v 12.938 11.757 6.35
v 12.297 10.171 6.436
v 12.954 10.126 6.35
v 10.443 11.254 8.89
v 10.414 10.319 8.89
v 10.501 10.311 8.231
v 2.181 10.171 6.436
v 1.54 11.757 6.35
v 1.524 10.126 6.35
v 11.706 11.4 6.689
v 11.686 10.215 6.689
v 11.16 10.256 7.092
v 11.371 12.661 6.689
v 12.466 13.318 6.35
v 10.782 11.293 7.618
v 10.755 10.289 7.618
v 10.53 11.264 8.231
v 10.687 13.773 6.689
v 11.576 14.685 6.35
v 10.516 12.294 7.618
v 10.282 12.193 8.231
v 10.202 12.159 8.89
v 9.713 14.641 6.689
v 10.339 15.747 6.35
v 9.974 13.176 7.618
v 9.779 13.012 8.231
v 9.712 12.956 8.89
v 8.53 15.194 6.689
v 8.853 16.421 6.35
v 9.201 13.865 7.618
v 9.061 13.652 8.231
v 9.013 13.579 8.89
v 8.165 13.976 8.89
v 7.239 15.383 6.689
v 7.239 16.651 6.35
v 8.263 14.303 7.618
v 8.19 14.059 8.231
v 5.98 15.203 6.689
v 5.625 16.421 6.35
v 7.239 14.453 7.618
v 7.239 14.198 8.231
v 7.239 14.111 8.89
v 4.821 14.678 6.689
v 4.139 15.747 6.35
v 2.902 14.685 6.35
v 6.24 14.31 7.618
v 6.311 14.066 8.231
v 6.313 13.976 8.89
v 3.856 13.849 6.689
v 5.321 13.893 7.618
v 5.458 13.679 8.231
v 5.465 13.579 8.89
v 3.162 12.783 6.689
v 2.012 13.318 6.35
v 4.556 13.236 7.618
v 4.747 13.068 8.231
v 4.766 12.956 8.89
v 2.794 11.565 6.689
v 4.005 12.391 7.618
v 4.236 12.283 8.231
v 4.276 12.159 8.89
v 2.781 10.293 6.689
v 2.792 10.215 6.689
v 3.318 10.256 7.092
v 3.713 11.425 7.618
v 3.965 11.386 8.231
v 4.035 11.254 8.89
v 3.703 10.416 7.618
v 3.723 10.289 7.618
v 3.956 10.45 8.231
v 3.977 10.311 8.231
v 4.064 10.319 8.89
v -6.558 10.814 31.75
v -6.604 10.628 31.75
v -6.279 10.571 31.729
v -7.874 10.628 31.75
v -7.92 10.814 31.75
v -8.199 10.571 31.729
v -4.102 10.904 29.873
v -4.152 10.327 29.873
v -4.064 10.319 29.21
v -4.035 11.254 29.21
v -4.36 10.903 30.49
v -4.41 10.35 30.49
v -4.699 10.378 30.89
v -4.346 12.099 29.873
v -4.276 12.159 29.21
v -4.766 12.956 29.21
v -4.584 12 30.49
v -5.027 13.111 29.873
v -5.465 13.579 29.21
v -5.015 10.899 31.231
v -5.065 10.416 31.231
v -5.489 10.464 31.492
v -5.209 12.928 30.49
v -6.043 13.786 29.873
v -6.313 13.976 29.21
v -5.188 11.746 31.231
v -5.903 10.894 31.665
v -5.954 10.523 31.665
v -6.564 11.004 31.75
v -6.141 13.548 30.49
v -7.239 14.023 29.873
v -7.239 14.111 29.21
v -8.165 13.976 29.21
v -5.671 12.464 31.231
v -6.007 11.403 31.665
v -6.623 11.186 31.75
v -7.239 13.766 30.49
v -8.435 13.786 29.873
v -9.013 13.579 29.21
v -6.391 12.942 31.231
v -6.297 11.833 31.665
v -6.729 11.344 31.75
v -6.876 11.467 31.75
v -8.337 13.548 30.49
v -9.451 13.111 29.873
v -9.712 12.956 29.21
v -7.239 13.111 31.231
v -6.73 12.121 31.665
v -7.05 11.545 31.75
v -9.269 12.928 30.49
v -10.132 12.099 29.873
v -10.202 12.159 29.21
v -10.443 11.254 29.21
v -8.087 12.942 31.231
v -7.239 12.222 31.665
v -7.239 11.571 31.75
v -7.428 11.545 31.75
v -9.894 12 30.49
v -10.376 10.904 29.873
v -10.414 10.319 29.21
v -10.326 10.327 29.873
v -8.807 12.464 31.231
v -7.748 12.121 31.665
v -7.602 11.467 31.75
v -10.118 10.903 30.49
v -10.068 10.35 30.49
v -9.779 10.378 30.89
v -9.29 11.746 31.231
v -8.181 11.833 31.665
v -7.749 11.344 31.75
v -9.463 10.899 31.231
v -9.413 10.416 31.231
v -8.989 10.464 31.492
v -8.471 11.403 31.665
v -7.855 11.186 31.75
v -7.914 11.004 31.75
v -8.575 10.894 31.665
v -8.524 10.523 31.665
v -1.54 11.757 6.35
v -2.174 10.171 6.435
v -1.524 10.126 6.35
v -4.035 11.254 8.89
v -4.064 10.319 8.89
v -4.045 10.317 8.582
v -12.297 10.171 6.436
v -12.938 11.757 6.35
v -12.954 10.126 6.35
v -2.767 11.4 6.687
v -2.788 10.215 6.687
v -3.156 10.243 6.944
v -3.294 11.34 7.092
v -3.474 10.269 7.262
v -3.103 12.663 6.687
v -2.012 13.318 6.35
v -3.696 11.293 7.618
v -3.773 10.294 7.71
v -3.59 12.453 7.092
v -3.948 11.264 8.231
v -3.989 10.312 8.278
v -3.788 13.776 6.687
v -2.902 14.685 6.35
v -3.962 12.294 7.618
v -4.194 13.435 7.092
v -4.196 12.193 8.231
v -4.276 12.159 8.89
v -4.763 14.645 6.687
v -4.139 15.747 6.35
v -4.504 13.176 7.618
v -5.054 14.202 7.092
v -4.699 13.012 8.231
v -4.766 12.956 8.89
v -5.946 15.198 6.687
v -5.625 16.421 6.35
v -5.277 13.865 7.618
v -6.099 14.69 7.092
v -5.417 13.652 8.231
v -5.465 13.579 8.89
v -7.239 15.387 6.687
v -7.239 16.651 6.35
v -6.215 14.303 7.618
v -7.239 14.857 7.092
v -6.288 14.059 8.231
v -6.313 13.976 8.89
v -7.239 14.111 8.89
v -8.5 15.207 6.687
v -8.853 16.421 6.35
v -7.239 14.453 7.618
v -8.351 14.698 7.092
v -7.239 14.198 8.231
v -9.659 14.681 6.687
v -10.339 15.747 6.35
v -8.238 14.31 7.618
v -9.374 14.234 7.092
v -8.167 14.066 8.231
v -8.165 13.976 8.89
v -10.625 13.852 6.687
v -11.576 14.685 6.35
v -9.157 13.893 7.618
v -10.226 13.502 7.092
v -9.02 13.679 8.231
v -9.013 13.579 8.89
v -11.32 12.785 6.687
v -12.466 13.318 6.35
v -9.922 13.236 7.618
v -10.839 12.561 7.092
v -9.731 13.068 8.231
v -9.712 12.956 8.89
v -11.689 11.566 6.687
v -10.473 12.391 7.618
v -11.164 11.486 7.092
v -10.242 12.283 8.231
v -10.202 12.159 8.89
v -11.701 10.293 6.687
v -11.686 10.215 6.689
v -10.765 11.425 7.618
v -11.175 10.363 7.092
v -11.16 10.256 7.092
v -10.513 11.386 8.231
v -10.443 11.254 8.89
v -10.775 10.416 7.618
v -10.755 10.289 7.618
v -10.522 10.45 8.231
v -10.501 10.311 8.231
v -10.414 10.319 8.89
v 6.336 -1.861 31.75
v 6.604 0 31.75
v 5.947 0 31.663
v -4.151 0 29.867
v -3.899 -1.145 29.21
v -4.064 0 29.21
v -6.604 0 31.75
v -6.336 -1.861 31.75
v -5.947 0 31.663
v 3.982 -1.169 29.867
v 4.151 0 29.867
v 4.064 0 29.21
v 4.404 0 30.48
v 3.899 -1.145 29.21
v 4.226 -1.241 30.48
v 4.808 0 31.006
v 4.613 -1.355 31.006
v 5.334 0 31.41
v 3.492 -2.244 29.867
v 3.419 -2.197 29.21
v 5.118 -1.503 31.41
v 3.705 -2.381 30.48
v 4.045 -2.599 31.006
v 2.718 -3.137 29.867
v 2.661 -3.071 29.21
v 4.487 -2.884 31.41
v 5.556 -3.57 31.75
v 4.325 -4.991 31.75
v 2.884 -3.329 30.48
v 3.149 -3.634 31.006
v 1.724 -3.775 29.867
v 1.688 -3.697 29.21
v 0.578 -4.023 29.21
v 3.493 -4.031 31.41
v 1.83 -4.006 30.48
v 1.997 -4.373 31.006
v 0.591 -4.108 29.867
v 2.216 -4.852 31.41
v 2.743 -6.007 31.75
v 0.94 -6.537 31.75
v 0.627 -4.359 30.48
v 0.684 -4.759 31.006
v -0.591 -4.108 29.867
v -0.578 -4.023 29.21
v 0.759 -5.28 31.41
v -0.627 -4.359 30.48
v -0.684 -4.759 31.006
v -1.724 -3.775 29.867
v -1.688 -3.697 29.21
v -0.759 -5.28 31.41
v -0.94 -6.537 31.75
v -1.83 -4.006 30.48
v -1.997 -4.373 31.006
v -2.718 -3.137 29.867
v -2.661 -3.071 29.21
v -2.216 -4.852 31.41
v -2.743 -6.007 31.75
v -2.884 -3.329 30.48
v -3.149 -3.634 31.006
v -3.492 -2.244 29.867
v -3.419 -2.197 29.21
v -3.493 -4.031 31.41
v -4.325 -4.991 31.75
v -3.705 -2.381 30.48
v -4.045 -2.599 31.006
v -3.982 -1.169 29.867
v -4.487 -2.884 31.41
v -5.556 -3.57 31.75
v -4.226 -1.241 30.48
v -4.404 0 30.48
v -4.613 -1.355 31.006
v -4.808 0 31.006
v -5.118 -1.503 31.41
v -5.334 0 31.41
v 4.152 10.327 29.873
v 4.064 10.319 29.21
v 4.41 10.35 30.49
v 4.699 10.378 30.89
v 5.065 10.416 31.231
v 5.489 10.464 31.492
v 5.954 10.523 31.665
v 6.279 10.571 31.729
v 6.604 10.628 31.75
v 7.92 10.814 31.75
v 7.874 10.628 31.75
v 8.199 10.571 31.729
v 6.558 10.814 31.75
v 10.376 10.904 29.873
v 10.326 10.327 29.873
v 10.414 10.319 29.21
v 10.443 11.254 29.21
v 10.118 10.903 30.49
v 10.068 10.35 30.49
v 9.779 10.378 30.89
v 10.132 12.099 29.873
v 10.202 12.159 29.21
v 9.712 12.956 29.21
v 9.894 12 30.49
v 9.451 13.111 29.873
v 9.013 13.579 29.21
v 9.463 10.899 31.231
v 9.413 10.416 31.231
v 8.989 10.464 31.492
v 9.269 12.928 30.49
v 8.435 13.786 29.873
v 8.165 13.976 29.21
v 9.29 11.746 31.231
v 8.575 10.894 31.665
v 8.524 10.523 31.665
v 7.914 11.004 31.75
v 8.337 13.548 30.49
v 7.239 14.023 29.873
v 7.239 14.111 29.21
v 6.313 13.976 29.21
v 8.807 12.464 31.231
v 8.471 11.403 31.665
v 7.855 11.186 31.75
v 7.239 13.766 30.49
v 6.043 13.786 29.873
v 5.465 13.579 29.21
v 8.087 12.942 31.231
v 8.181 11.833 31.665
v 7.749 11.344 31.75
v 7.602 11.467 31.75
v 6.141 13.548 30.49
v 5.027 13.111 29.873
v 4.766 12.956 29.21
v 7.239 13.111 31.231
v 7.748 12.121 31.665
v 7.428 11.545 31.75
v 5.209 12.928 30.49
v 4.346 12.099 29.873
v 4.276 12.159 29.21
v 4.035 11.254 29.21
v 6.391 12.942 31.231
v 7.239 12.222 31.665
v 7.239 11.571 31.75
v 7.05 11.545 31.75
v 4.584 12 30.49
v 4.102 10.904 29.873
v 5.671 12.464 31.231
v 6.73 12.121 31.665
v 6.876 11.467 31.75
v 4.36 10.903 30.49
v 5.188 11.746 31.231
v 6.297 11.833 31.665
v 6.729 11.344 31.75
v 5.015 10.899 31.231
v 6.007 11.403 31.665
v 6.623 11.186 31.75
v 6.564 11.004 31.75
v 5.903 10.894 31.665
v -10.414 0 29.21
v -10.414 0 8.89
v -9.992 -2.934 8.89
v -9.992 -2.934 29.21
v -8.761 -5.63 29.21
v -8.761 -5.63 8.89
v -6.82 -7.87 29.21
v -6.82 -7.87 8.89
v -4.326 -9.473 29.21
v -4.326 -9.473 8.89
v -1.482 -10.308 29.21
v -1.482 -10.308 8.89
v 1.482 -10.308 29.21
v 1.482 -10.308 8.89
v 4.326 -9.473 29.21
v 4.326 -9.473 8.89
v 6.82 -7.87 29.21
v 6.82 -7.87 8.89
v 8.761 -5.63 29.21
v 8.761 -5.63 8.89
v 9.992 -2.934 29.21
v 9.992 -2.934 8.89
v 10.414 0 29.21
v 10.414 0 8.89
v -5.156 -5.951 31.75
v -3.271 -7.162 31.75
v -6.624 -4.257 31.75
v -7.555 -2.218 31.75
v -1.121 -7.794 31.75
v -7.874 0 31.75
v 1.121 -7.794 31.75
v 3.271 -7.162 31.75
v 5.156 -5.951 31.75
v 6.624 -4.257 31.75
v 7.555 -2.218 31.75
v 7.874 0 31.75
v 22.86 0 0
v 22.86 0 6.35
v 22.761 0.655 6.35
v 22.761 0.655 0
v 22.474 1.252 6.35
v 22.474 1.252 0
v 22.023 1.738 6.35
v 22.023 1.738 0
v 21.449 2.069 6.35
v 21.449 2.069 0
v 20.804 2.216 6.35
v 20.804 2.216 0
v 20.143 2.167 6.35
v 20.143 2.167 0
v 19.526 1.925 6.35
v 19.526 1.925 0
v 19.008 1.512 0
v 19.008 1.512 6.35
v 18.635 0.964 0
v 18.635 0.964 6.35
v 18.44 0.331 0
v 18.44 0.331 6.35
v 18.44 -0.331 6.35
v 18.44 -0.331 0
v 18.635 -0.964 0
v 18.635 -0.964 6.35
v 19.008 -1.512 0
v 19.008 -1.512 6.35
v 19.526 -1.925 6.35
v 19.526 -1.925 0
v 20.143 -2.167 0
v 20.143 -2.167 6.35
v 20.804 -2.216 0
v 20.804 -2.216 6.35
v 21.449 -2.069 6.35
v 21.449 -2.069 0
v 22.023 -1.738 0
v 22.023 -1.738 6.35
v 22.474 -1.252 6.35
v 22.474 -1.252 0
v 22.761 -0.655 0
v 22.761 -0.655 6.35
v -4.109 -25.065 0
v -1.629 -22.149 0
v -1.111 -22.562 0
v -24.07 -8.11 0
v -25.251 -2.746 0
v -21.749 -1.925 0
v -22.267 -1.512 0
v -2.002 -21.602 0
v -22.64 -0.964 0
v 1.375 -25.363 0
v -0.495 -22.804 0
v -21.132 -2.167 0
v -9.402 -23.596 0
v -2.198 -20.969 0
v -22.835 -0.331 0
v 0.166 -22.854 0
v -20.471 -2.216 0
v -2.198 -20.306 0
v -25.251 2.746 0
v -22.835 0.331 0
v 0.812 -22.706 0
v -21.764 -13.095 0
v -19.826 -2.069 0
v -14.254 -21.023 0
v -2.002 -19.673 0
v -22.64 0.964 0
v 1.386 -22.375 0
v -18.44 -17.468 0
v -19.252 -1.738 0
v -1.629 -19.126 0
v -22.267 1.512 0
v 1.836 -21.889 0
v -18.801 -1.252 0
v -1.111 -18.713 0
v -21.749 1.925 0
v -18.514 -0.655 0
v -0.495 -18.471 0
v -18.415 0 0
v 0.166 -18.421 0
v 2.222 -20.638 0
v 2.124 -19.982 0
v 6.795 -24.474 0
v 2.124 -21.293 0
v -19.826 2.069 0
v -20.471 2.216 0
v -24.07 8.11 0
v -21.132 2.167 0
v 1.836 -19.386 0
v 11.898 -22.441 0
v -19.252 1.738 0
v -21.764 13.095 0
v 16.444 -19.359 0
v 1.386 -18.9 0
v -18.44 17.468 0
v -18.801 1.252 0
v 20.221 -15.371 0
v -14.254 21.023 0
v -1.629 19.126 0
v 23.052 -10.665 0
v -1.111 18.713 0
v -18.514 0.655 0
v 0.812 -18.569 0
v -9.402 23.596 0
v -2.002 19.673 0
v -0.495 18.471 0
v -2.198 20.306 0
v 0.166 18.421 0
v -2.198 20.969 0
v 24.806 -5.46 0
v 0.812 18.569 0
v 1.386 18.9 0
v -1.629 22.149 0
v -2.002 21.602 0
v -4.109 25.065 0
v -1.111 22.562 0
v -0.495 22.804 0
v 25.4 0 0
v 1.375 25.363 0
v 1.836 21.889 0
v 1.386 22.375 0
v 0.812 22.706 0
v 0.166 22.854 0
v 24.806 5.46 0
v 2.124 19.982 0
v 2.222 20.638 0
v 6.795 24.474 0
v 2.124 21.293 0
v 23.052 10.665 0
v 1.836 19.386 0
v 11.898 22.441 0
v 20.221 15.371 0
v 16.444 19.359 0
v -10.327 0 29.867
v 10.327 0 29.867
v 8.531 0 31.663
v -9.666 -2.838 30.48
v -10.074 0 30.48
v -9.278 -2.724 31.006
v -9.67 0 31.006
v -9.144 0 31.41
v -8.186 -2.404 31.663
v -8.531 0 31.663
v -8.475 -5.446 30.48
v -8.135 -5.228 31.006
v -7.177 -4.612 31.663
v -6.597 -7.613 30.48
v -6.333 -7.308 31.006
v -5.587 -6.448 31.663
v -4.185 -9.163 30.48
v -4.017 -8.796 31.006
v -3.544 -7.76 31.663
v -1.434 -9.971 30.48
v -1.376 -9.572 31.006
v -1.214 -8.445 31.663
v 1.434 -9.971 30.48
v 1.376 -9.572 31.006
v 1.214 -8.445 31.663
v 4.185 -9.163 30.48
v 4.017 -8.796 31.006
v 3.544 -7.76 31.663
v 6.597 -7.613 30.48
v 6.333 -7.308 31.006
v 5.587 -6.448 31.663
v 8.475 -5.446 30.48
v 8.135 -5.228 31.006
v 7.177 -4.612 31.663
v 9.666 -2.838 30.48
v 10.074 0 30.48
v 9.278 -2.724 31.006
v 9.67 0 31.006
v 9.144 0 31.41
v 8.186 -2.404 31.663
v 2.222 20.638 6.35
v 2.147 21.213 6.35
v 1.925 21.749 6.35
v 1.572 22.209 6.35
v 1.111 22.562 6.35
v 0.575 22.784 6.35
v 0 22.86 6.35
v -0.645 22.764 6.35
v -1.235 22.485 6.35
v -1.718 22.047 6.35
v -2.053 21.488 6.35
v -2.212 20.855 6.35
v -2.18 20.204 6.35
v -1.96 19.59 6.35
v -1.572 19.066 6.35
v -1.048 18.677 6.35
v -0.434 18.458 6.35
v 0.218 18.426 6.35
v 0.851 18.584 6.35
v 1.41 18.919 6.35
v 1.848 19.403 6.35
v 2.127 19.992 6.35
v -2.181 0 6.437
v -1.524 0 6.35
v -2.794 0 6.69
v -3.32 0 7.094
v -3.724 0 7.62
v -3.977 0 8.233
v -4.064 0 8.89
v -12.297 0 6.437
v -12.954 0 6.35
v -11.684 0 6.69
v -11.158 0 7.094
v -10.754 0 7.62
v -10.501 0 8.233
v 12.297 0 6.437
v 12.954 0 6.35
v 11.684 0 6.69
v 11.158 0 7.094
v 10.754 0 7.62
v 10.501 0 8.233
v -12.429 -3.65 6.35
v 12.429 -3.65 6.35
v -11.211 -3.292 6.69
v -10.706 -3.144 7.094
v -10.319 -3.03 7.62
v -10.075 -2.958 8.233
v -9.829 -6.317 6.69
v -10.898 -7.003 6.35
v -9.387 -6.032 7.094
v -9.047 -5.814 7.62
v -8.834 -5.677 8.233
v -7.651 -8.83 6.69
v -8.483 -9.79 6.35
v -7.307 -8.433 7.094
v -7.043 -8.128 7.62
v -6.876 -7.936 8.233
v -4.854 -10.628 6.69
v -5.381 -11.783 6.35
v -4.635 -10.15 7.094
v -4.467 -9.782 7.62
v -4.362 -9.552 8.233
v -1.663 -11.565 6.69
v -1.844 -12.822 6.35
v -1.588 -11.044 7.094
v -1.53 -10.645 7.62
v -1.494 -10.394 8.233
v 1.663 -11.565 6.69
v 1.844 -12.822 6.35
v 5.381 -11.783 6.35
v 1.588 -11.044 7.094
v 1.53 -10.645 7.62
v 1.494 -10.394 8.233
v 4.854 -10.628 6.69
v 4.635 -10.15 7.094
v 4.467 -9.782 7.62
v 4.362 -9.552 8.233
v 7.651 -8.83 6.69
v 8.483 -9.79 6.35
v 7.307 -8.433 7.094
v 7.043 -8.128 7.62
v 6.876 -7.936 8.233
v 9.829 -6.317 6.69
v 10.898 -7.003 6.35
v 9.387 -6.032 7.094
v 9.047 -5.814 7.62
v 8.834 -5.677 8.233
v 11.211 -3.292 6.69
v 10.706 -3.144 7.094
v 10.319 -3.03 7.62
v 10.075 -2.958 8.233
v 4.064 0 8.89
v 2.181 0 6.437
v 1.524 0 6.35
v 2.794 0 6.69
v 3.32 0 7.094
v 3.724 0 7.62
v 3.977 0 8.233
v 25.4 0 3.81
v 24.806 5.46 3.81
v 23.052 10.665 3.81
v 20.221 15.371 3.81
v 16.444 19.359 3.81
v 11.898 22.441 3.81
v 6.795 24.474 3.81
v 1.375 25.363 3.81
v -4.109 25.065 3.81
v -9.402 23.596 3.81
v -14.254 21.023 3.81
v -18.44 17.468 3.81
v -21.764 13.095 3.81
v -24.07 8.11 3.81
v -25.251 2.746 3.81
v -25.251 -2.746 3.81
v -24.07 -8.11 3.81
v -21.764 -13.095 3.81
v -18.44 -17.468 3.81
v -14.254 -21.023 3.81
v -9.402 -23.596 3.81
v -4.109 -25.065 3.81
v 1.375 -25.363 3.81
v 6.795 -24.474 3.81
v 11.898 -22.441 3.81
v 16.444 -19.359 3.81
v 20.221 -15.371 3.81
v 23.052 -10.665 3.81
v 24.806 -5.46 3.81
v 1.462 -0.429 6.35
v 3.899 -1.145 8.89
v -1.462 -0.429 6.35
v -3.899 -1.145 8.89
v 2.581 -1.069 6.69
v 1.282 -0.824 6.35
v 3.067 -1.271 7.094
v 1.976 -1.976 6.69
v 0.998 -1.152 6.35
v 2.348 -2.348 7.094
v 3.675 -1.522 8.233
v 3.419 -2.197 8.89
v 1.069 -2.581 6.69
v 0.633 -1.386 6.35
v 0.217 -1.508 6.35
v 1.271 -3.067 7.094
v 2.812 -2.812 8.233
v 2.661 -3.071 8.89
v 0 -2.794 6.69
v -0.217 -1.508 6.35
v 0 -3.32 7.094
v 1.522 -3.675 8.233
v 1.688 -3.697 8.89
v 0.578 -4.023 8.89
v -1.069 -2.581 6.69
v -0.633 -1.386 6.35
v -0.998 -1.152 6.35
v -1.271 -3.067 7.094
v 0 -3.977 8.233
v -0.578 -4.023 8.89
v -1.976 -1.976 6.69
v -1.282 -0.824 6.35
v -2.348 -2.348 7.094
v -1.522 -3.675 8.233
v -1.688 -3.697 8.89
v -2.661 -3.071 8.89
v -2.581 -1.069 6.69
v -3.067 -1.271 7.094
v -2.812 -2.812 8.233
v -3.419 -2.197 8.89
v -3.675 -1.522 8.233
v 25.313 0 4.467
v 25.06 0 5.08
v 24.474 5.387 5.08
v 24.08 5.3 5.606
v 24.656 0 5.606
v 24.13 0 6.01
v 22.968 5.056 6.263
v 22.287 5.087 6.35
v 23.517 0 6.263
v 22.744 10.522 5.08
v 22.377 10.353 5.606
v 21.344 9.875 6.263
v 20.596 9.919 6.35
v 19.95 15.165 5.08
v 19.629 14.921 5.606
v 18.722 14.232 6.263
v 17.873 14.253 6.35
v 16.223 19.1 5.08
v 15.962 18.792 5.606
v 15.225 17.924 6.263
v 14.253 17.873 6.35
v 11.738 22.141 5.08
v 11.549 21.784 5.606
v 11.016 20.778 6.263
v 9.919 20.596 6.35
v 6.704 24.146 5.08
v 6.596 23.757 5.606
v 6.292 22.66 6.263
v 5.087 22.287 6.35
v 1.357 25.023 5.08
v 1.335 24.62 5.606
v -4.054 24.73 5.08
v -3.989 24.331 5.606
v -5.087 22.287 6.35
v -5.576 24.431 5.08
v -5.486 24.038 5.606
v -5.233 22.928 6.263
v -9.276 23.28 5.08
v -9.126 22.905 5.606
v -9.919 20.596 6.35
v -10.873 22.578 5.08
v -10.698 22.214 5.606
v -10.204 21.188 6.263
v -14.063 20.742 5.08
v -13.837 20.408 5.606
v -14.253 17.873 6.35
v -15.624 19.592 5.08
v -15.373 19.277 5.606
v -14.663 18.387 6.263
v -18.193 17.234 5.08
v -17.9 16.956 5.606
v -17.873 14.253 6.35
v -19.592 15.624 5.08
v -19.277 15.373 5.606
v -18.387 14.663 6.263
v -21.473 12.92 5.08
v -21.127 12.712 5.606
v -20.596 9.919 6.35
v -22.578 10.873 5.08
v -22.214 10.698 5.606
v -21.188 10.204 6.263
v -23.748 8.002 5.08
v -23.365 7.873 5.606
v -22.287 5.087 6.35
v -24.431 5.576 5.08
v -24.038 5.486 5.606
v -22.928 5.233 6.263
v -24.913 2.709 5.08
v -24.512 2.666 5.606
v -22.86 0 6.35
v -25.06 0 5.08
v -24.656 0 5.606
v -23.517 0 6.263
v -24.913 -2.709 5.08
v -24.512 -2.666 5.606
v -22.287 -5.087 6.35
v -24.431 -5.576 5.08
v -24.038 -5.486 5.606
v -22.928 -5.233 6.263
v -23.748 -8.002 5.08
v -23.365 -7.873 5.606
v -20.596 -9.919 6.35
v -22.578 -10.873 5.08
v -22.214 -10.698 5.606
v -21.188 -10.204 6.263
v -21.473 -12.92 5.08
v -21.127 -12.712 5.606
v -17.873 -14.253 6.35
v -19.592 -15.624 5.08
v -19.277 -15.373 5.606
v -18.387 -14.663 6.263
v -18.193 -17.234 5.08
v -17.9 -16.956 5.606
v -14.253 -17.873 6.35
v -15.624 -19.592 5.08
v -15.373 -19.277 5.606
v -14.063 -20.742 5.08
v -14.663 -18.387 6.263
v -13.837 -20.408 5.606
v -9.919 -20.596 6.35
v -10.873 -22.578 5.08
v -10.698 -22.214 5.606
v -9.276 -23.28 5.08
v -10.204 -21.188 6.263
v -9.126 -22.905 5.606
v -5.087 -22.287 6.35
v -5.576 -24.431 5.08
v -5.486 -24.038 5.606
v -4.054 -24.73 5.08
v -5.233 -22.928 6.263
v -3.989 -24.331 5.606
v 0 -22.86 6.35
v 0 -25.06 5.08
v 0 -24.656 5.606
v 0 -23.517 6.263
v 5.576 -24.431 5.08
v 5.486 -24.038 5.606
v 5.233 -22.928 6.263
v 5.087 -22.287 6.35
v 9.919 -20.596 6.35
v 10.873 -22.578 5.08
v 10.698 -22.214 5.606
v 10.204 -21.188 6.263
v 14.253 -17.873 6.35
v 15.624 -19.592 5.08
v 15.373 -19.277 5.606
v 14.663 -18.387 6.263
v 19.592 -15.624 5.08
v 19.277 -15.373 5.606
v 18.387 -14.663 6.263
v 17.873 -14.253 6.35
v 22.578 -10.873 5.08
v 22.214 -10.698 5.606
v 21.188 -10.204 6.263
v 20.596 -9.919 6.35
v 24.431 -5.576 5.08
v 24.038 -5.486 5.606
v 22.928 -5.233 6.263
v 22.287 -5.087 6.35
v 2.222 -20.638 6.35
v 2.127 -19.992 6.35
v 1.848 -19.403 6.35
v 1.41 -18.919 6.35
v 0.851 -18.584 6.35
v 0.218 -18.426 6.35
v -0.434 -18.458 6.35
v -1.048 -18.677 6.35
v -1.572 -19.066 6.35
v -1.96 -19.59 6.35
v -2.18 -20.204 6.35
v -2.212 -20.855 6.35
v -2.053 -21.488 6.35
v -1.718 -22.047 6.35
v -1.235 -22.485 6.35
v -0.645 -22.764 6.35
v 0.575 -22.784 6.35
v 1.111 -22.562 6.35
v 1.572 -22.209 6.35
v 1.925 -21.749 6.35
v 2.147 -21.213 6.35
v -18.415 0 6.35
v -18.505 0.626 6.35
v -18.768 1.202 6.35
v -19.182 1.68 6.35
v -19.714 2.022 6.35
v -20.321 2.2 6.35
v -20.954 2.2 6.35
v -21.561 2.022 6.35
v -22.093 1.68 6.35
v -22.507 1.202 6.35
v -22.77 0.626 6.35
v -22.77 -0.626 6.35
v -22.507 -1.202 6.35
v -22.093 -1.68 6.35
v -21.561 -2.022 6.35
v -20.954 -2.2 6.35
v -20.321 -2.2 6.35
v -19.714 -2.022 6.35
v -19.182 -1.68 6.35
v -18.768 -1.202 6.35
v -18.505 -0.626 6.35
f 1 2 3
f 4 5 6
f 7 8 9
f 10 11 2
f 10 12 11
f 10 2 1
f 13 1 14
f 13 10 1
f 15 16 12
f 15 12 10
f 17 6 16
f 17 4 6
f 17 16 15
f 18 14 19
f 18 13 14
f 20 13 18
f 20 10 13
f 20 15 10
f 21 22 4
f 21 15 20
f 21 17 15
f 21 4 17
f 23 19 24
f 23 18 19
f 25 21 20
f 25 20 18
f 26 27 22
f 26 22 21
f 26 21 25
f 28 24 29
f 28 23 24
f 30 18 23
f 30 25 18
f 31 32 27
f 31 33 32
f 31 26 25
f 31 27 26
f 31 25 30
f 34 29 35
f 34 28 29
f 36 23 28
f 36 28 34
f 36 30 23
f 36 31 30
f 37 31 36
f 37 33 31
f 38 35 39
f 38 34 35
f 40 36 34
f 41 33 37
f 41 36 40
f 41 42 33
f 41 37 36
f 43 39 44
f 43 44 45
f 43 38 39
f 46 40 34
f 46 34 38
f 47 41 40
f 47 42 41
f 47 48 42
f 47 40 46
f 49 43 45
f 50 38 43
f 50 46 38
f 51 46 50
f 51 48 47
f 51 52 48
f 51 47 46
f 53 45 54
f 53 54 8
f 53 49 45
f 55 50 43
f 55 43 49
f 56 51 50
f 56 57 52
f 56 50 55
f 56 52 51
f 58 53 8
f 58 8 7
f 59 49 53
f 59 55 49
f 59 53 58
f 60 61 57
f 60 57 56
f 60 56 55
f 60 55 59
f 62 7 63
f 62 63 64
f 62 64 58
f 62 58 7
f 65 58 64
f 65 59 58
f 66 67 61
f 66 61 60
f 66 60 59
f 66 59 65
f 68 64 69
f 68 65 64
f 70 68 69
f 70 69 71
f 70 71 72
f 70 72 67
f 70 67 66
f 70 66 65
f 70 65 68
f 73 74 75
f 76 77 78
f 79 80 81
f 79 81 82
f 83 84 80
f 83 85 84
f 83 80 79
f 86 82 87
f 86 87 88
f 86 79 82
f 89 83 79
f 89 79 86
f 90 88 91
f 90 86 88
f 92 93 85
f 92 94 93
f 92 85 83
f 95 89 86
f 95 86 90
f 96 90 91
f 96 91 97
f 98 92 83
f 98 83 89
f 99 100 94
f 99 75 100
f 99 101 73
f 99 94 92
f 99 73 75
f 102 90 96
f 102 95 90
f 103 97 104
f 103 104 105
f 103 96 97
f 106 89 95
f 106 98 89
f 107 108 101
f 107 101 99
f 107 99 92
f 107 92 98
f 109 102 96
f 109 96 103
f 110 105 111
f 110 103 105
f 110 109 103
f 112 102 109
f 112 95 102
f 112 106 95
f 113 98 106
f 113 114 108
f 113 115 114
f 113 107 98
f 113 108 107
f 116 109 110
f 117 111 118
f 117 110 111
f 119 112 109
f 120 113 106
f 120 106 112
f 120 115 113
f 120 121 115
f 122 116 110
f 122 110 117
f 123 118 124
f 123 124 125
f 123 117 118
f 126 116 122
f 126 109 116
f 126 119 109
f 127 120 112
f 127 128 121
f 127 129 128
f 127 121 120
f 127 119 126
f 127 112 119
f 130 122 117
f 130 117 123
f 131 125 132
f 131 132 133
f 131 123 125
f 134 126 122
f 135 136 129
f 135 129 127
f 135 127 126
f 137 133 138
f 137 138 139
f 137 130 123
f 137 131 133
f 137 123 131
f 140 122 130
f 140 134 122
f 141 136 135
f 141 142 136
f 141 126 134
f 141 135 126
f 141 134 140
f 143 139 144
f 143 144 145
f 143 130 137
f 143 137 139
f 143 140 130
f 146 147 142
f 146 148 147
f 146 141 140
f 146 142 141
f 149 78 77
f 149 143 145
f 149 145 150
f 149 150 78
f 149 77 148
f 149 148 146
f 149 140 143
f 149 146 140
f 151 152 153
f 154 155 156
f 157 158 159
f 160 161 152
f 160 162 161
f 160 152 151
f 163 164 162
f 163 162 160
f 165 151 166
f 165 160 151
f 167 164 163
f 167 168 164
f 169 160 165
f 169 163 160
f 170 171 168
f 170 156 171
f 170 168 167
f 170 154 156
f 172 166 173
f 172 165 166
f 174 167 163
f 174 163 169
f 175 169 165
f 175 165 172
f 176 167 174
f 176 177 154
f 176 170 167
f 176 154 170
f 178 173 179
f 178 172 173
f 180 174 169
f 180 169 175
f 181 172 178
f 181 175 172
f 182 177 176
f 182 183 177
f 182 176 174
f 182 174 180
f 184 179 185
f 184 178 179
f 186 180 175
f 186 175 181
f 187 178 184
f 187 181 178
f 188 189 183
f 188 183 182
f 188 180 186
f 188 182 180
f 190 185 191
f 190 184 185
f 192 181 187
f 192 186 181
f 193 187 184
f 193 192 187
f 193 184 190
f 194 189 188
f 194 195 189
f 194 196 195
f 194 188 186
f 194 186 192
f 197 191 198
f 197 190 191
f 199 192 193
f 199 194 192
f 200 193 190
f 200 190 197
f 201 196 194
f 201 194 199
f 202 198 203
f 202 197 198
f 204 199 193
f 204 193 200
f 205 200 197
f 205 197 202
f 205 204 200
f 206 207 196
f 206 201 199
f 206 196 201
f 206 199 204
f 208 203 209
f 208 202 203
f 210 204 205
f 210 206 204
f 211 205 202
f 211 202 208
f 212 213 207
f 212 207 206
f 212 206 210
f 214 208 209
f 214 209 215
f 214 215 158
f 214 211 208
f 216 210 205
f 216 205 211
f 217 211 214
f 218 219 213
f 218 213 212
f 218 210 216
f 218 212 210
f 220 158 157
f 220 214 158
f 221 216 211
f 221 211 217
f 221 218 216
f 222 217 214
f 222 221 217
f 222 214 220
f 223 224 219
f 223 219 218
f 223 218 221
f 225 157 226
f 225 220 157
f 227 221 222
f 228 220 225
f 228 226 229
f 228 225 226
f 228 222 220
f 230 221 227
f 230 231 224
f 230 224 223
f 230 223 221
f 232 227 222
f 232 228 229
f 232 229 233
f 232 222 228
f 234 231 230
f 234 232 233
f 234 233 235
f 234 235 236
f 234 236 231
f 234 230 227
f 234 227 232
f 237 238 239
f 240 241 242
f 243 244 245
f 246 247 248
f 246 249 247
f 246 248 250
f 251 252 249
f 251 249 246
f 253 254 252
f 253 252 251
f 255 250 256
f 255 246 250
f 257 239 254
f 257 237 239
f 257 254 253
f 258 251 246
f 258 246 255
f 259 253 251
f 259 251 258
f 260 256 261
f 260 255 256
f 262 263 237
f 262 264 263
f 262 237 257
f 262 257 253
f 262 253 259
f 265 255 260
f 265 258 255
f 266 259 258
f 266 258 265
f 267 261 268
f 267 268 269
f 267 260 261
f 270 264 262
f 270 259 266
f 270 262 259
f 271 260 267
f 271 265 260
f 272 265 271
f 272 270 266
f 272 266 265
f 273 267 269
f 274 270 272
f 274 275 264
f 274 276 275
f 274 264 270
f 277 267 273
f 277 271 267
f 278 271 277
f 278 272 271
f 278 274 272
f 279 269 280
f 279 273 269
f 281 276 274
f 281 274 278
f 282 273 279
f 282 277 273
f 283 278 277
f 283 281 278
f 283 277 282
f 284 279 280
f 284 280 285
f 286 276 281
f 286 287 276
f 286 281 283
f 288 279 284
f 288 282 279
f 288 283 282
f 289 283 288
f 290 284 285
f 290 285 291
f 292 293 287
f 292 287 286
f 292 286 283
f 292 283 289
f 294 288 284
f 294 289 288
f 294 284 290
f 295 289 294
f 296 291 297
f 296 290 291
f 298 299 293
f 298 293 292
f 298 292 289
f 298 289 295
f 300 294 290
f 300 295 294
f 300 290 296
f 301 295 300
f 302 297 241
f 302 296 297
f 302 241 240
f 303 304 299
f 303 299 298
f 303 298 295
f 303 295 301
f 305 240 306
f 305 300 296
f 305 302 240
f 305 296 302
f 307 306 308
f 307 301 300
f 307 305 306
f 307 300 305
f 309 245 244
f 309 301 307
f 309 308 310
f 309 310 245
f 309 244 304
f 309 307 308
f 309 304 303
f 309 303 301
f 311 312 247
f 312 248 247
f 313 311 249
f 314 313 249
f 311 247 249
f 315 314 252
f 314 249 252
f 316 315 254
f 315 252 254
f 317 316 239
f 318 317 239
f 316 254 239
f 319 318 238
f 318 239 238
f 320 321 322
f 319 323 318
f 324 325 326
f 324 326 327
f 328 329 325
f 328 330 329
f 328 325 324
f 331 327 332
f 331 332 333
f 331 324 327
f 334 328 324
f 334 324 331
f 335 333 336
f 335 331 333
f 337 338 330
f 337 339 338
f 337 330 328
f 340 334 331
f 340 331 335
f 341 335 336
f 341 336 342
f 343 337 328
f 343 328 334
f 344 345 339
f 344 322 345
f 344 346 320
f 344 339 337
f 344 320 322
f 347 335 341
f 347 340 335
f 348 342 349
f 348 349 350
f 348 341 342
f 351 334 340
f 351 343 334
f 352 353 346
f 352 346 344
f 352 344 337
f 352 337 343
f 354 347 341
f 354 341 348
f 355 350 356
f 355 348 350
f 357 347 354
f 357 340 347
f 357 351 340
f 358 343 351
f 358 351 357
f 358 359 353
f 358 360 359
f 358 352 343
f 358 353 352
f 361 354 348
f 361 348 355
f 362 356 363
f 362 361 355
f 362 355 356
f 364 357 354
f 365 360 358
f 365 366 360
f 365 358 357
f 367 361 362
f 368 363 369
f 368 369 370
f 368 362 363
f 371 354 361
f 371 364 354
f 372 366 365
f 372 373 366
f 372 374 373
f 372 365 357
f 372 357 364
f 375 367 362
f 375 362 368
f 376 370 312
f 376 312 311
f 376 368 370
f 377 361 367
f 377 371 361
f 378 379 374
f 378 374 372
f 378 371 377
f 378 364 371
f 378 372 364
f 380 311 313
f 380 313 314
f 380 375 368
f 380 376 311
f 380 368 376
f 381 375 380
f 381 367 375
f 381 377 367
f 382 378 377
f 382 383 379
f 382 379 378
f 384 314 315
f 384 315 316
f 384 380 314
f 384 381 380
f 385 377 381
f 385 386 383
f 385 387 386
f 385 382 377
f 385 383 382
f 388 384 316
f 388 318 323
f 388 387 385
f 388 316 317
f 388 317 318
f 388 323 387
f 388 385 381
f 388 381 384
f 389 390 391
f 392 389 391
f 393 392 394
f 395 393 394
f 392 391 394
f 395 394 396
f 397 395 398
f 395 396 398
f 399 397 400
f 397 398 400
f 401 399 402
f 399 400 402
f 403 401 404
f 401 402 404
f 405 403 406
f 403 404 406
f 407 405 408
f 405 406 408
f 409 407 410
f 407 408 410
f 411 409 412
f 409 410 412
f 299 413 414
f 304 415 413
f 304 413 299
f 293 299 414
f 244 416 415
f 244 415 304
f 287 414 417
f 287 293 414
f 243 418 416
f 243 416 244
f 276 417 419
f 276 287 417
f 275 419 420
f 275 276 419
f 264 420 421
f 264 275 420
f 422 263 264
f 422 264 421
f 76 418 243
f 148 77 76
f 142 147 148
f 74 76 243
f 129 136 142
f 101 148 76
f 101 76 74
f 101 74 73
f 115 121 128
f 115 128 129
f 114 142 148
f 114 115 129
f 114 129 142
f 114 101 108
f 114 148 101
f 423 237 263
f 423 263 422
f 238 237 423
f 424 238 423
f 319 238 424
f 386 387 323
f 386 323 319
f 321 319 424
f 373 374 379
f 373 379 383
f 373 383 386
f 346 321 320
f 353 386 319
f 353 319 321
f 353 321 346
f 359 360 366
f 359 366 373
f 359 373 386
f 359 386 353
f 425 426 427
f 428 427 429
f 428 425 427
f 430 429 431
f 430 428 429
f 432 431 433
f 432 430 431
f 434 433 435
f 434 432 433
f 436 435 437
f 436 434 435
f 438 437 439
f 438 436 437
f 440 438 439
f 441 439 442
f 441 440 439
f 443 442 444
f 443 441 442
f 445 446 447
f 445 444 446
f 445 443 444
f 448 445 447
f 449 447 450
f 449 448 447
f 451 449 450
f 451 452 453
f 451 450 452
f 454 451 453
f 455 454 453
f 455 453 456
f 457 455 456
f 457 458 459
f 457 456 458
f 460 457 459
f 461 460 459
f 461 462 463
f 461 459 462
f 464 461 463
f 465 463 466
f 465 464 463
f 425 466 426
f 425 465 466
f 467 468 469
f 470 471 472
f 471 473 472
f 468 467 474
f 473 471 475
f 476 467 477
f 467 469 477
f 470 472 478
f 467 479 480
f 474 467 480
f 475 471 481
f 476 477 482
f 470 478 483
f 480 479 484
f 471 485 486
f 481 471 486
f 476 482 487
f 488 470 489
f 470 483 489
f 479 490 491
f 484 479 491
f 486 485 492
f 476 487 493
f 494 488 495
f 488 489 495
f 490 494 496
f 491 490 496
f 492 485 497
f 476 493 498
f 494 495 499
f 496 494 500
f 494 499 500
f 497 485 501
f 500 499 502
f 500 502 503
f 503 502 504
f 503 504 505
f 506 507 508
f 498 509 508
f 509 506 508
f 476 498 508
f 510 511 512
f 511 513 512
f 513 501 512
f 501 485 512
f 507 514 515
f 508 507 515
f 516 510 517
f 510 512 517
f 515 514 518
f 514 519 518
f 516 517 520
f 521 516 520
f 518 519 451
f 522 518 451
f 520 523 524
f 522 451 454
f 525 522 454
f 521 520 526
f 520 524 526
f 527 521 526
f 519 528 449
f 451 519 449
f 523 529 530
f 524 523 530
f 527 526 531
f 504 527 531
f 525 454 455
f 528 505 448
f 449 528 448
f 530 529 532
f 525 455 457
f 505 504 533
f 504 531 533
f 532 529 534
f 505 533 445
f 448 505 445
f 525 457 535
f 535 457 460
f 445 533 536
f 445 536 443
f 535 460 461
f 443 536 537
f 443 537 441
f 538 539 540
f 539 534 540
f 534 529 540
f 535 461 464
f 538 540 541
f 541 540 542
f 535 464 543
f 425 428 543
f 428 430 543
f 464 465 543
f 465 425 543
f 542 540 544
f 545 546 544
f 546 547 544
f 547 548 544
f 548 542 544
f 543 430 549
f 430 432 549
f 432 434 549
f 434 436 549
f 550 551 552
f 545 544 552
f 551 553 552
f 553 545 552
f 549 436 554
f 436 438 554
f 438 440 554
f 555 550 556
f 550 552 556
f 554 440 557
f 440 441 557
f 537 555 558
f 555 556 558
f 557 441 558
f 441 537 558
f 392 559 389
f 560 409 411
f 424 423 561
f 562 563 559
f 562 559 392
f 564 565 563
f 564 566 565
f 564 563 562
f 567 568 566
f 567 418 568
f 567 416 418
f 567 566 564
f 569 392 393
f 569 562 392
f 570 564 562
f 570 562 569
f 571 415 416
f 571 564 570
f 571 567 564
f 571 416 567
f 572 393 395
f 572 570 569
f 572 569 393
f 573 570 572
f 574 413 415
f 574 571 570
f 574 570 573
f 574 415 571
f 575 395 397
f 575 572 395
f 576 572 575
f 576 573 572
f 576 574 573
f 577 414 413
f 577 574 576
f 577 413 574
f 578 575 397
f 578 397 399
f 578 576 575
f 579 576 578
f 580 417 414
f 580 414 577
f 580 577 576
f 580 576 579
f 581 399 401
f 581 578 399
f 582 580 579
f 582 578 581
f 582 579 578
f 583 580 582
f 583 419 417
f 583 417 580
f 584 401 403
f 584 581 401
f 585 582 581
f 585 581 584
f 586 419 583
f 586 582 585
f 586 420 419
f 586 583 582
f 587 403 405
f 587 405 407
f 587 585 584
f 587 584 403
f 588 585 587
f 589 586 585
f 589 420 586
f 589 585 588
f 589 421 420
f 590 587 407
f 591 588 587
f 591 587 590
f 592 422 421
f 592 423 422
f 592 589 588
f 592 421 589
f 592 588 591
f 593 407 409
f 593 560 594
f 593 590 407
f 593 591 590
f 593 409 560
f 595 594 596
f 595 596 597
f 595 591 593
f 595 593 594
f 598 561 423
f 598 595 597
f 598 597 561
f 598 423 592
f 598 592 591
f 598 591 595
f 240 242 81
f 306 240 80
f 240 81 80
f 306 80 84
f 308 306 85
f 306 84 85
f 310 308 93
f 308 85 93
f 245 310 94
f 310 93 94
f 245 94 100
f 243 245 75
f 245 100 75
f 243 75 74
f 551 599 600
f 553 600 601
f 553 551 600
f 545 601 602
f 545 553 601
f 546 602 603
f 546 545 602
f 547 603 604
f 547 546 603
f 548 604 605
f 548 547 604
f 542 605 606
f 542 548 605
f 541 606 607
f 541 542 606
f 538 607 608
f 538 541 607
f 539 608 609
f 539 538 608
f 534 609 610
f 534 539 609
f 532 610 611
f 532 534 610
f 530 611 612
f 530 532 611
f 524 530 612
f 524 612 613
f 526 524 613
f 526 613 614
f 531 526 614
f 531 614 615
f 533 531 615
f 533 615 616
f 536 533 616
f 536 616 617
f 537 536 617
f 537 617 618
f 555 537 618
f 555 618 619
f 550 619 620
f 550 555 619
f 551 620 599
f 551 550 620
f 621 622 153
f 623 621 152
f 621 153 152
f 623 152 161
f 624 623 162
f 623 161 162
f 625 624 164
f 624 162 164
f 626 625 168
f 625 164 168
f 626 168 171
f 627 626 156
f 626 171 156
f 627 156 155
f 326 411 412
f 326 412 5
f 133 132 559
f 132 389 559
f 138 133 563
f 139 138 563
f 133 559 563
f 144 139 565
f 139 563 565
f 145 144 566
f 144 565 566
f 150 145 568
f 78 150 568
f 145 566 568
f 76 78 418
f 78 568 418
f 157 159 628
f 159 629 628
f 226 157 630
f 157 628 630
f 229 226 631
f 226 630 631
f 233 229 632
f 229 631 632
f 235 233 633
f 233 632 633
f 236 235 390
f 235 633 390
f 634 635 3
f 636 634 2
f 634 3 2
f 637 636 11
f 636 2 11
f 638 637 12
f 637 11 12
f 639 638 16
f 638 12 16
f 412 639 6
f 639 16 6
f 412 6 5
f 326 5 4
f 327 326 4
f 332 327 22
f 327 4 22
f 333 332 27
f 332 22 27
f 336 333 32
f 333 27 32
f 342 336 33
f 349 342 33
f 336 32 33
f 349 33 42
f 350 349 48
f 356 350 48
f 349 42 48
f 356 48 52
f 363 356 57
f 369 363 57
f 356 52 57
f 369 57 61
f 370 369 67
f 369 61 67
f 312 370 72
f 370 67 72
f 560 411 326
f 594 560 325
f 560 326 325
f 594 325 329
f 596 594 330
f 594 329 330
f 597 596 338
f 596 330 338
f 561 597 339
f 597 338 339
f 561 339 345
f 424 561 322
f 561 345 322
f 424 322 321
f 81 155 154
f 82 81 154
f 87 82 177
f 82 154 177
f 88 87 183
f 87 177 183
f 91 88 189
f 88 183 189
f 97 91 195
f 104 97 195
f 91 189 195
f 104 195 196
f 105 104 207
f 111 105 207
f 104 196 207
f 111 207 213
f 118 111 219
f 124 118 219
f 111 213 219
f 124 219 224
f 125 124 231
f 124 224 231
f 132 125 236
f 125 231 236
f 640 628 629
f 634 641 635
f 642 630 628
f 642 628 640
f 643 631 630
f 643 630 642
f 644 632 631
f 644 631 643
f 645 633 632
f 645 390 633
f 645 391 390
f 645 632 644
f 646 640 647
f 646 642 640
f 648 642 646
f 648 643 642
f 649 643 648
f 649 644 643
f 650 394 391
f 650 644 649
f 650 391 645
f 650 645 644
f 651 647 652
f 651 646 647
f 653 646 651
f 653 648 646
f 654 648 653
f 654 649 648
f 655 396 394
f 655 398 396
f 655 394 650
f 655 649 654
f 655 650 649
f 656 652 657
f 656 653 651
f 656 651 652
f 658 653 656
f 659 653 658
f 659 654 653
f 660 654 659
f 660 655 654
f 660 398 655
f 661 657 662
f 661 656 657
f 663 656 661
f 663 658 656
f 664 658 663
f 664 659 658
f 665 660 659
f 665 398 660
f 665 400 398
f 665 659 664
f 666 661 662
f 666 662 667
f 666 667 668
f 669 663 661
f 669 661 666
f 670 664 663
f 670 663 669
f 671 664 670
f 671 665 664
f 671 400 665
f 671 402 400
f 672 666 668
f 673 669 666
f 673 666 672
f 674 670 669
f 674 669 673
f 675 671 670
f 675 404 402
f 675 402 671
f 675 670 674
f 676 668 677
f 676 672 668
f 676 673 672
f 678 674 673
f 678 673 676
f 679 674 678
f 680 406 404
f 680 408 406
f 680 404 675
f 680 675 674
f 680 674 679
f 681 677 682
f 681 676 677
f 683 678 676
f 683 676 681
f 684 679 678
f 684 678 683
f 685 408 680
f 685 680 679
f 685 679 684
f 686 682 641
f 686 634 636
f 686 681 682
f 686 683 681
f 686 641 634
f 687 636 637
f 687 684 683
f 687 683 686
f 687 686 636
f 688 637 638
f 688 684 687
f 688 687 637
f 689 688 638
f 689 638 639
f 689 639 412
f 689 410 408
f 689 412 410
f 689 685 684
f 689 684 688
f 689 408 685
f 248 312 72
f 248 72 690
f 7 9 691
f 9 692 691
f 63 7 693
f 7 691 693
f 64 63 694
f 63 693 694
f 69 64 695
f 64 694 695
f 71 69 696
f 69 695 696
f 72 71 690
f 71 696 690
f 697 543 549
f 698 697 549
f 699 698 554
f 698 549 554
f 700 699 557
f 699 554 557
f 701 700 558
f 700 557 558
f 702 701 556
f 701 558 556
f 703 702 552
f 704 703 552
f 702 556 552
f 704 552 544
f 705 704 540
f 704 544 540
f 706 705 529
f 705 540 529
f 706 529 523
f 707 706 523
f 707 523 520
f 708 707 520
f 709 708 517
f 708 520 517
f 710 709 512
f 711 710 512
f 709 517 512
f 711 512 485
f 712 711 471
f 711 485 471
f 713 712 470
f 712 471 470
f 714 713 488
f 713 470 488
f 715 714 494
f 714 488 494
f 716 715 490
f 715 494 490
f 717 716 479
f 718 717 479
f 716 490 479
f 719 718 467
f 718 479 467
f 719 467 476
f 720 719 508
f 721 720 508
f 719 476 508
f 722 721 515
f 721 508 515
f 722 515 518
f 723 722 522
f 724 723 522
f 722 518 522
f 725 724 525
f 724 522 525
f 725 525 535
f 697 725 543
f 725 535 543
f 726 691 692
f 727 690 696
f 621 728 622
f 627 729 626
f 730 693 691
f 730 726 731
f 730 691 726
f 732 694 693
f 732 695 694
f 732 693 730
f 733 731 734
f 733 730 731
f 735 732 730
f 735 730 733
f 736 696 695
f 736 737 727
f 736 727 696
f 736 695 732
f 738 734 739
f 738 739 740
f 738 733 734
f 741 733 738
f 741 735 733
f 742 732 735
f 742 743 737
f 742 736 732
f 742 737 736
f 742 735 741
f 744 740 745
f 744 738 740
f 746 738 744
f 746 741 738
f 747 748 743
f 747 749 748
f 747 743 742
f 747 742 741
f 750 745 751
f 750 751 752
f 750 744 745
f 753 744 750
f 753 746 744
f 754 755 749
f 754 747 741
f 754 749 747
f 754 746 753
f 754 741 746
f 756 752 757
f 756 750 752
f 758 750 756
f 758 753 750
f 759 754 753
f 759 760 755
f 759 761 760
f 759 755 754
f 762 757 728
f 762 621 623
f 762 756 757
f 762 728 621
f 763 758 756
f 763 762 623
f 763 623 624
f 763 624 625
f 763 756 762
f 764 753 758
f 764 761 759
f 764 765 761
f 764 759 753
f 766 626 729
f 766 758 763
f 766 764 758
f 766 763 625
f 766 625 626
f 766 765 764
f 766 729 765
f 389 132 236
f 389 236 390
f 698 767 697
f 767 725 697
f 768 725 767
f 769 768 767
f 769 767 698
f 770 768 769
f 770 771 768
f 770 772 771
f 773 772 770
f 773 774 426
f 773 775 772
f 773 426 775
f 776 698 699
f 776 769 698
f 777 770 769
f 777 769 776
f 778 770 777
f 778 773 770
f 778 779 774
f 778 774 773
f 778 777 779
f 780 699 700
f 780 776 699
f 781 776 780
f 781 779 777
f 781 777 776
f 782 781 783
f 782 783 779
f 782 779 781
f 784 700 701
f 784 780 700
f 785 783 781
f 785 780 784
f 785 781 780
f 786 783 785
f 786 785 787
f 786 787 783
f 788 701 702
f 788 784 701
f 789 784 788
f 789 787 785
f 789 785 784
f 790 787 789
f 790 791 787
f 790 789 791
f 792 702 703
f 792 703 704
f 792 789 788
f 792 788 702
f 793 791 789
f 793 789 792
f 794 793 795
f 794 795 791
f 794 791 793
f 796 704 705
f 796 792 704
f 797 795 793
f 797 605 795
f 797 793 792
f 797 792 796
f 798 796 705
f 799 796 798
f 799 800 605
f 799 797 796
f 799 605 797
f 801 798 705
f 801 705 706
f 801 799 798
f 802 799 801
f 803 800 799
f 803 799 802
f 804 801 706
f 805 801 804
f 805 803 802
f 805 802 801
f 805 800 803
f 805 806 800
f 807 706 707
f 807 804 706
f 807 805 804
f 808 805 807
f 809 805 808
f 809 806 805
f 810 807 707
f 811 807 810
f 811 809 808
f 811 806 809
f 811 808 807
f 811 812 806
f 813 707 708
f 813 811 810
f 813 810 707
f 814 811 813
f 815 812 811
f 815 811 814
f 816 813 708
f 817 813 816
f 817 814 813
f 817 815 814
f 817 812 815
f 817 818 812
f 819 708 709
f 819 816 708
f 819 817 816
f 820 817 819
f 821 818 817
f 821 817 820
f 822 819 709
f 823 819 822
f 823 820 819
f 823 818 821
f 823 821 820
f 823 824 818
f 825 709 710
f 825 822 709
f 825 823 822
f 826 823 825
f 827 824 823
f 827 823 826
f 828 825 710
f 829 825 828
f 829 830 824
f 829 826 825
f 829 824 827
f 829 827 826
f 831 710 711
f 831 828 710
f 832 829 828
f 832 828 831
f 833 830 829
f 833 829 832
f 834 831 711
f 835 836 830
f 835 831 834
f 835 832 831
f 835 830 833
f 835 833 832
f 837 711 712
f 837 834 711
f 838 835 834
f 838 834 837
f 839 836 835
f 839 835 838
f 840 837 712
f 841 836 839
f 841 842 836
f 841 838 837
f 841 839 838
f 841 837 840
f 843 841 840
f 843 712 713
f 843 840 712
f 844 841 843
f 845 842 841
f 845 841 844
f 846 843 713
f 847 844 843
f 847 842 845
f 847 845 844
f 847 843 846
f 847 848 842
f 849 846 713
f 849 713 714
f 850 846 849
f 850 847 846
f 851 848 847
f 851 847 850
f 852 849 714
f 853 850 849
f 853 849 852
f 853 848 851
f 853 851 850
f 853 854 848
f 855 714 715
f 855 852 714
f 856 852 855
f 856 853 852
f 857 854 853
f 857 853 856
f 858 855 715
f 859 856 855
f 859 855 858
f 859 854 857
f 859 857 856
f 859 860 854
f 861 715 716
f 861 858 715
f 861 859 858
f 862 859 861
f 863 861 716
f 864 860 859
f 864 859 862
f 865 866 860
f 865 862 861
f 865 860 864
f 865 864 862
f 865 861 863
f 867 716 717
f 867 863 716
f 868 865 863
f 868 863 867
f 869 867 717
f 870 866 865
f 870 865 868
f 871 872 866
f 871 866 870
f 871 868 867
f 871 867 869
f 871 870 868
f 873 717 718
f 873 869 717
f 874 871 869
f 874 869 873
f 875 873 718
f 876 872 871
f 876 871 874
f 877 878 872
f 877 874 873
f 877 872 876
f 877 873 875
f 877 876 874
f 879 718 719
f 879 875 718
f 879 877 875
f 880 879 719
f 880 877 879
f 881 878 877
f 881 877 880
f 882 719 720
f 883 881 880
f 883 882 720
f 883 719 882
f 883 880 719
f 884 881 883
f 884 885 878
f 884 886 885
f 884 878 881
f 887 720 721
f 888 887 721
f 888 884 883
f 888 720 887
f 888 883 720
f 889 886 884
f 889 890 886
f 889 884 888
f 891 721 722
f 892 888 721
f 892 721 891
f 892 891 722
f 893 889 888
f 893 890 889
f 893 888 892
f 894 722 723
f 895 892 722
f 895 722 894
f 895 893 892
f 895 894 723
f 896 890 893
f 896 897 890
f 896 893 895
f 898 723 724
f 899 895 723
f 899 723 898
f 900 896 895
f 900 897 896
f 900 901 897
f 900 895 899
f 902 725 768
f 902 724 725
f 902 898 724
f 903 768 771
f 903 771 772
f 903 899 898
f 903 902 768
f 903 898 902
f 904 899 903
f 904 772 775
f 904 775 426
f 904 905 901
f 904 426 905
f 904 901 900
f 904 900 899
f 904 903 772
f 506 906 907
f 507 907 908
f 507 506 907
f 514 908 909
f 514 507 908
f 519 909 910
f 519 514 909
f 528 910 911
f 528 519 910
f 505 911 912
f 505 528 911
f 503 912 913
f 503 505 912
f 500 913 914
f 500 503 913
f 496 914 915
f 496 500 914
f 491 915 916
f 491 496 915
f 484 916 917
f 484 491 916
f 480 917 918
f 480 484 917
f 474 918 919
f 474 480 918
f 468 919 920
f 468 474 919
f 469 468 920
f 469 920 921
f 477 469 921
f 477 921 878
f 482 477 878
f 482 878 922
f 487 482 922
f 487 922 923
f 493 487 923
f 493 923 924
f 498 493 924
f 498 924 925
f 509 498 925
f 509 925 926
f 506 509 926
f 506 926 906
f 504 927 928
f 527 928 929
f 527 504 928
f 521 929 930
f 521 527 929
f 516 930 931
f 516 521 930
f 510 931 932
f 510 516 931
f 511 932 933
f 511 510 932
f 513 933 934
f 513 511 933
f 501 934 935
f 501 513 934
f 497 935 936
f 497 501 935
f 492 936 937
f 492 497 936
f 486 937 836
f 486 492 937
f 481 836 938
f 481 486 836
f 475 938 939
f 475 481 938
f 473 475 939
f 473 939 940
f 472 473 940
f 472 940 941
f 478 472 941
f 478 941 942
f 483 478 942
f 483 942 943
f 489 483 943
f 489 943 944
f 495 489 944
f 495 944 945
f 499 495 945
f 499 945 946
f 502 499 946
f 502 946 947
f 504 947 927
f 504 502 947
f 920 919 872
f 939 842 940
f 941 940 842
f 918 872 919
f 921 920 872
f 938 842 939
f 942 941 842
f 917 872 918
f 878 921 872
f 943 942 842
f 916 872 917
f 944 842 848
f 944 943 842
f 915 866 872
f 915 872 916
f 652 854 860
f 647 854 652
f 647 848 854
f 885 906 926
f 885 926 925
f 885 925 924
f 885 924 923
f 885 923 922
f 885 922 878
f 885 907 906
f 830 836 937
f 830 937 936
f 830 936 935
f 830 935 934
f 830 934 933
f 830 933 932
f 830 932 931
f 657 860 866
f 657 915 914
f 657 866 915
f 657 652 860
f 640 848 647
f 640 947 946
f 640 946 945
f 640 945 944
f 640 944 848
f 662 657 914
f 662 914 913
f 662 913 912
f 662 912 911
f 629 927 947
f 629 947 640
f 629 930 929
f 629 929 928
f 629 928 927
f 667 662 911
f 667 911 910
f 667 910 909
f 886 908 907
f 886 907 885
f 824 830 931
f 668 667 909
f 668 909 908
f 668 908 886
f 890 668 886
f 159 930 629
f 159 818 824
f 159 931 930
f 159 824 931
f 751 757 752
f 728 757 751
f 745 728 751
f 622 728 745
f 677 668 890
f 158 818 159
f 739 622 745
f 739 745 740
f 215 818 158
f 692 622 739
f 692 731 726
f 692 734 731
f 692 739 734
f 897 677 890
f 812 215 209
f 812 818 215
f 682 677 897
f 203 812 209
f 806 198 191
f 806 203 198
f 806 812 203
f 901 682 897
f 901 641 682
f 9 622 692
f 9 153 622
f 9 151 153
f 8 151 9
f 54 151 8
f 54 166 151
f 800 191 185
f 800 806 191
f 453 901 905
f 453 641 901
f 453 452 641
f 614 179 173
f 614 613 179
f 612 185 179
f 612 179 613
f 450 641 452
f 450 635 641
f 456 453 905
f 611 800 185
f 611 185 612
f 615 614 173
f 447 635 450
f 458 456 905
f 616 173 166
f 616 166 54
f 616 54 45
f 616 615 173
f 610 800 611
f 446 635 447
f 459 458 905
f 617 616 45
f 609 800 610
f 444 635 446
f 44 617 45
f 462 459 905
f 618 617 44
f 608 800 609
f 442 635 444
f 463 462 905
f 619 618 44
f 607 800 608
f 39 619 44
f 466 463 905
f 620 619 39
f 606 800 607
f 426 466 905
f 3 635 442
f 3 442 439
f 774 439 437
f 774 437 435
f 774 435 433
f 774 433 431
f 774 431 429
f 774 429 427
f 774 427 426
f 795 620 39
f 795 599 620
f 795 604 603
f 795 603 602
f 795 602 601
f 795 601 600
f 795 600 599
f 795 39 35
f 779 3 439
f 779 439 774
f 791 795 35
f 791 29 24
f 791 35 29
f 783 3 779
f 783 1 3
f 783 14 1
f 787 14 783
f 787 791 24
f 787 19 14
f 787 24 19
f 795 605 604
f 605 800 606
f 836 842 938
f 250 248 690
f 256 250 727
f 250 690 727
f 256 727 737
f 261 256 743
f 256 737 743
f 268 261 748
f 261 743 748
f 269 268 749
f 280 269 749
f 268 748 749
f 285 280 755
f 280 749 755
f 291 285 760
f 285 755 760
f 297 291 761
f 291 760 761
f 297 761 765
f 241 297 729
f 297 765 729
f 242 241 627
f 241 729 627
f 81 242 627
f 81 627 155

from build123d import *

# Parameters (mm, degrees)
F0_R     = 25.4
F0_R_2   = 2.2225
F1_DEPTH = 6.35
F3_DEPTH = 25.4
F5_R     = 2.54
F6_DEPTH = 25.4


# Not quite as in the source:
# - a feature of the source that left no trace in its solid (it failed there, or was rolled back) is left out


with BuildPart() as f1:
    # F0 (on Top) → F1 (new body)
    with BuildSketch(Plane.XY):
        Circle(F0_R)
        with Locations((0, -20.6375)):
            Circle(F0_R_2, mode=Mode.SUBTRACT)
        with Locations((-20.6375, 0)):
            Circle(F0_R_2, mode=Mode.SUBTRACT)
        with Locations((20.6375, 0)):
            Circle(F0_R_2, mode=Mode.SUBTRACT)
        with BuildLine():
            Line((-4.064, 10.31875), (-4.064, 0))
            ThreePointArc((-4.064, 0), (0, -4.064), (4.064, 0))
            Line((4.064, 0), (4.064, 10.31875))
            ThreePointArc((4.064, 10.31875), (7.239, 14.1114143812), (10.414, 10.31875))
            Line((10.414, 10.31875), (10.414, 0))
            ThreePointArc((10.414, 0), (0, -10.414), (-10.414, 0))
            Line((-10.414, 0), (-10.414, 10.31875))
            ThreePointArc((-10.414, 10.31875), (-7.239, 14.1114143812), (-4.064, 10.31875))
        make_face(mode=Mode.SUBTRACT)
        with Locations((0, 20.6375)):
            Circle(F0_R_2, mode=Mode.SUBTRACT)
        with BuildLine():
            ThreePointArc((4.064, 0), (0, -4.064), (-4.064, 0))
            Line((-4.064, 0), (-4.064, 10.31875))
            ThreePointArc((-4.064, 10.31875), (-7.239, 14.1114143812), (-10.414, 10.31875))
            Line((-10.414, 10.31875), (-10.414, 0))
            ThreePointArc((-10.414, 0), (0, -10.414), (10.414, 0))
            Line((10.414, 0), (10.414, 10.31875))
            ThreePointArc((10.414, 10.31875), (7.239, 14.1114143812), (4.064, 10.31875))
            Line((4.064, 10.31875), (4.064, 0))
        make_face()
        with Locations((0, -20.6375)):
            Circle(F0_R_2)
        with Locations((-20.6375, 0)):
            Circle(F0_R_2)
        with Locations((0, 20.6375)):
            Circle(F0_R_2)
        with Locations((20.6375, 0)):
            Circle(F0_R_2)
    extrude(amount=F1_DEPTH)

    # F2 (on face) → F3 (join)
    with BuildSketch(Plane.XY.offset(6.35)):
        with BuildLine():
            Line((-10.414, 10.31875), (-10.414, 0))
            ThreePointArc((-10.414, 0), (0, -10.414), (10.414, 0))
            Line((10.414, 0), (10.414, 10.31875))
            ThreePointArc((10.414, 10.31875), (7.239, 14.1114143812), (4.064, 10.31875))
            Line((4.064, 10.31875), (4.064, 0))
            ThreePointArc((4.064, 0), (0, -4.064), (-4.064, 0))
            Line((-4.064, 0), (-4.064, 10.31875))
            ThreePointArc((-4.064, 10.31875), (-7.239, 14.1114143812), (-10.414, 10.31875))
        make_face()
    extrude(amount=F3_DEPTH)

    # F5
    f5_edges = [f1.edges().sort_by_distance(p)[0] for p in [
        (-4.064, 5.159375, 31.75),
        (-7.239, 14.111414, 31.75),
        (-10.414, 5.159375, 31.75),
        (0, -10.414, 31.75),
        (10.414, 5.159375, 31.75),
        (7.239, 14.111414, 31.75),
        (4.064, 5.159375, 31.75),
        (0, -4.064, 31.75),
        (-25.4, 0, 6.35),
        (-4.064, 5.159375, 6.35),
        (-7.239, 14.111414, 6.35),
        (-10.414, 5.159375, 6.35),
        (0, -10.414, 6.35),
        (10.414, 5.159375, 6.35),
        (7.239, 14.111414, 6.35),
        (4.064, 5.159375, 6.35),
        (0, -4.064, 6.35),
    ]]
    fillet(f5_edges, radius=F5_R)

    # F0 (on Top) → F6 (cut)
    with BuildSketch(Plane.XY):
        with Locations((20.6375, 0)):
            Circle(F0_R_2)
        with Locations((0, 20.6375)):
            Circle(F0_R_2)
        with Locations((-20.6375, 0)):
            Circle(F0_R_2)
        with Locations((0, -20.6375)):
            Circle(F0_R_2)
    extrude(amount=F6_DEPTH, mode=Mode.SUBTRACT)


solid = f1.part
